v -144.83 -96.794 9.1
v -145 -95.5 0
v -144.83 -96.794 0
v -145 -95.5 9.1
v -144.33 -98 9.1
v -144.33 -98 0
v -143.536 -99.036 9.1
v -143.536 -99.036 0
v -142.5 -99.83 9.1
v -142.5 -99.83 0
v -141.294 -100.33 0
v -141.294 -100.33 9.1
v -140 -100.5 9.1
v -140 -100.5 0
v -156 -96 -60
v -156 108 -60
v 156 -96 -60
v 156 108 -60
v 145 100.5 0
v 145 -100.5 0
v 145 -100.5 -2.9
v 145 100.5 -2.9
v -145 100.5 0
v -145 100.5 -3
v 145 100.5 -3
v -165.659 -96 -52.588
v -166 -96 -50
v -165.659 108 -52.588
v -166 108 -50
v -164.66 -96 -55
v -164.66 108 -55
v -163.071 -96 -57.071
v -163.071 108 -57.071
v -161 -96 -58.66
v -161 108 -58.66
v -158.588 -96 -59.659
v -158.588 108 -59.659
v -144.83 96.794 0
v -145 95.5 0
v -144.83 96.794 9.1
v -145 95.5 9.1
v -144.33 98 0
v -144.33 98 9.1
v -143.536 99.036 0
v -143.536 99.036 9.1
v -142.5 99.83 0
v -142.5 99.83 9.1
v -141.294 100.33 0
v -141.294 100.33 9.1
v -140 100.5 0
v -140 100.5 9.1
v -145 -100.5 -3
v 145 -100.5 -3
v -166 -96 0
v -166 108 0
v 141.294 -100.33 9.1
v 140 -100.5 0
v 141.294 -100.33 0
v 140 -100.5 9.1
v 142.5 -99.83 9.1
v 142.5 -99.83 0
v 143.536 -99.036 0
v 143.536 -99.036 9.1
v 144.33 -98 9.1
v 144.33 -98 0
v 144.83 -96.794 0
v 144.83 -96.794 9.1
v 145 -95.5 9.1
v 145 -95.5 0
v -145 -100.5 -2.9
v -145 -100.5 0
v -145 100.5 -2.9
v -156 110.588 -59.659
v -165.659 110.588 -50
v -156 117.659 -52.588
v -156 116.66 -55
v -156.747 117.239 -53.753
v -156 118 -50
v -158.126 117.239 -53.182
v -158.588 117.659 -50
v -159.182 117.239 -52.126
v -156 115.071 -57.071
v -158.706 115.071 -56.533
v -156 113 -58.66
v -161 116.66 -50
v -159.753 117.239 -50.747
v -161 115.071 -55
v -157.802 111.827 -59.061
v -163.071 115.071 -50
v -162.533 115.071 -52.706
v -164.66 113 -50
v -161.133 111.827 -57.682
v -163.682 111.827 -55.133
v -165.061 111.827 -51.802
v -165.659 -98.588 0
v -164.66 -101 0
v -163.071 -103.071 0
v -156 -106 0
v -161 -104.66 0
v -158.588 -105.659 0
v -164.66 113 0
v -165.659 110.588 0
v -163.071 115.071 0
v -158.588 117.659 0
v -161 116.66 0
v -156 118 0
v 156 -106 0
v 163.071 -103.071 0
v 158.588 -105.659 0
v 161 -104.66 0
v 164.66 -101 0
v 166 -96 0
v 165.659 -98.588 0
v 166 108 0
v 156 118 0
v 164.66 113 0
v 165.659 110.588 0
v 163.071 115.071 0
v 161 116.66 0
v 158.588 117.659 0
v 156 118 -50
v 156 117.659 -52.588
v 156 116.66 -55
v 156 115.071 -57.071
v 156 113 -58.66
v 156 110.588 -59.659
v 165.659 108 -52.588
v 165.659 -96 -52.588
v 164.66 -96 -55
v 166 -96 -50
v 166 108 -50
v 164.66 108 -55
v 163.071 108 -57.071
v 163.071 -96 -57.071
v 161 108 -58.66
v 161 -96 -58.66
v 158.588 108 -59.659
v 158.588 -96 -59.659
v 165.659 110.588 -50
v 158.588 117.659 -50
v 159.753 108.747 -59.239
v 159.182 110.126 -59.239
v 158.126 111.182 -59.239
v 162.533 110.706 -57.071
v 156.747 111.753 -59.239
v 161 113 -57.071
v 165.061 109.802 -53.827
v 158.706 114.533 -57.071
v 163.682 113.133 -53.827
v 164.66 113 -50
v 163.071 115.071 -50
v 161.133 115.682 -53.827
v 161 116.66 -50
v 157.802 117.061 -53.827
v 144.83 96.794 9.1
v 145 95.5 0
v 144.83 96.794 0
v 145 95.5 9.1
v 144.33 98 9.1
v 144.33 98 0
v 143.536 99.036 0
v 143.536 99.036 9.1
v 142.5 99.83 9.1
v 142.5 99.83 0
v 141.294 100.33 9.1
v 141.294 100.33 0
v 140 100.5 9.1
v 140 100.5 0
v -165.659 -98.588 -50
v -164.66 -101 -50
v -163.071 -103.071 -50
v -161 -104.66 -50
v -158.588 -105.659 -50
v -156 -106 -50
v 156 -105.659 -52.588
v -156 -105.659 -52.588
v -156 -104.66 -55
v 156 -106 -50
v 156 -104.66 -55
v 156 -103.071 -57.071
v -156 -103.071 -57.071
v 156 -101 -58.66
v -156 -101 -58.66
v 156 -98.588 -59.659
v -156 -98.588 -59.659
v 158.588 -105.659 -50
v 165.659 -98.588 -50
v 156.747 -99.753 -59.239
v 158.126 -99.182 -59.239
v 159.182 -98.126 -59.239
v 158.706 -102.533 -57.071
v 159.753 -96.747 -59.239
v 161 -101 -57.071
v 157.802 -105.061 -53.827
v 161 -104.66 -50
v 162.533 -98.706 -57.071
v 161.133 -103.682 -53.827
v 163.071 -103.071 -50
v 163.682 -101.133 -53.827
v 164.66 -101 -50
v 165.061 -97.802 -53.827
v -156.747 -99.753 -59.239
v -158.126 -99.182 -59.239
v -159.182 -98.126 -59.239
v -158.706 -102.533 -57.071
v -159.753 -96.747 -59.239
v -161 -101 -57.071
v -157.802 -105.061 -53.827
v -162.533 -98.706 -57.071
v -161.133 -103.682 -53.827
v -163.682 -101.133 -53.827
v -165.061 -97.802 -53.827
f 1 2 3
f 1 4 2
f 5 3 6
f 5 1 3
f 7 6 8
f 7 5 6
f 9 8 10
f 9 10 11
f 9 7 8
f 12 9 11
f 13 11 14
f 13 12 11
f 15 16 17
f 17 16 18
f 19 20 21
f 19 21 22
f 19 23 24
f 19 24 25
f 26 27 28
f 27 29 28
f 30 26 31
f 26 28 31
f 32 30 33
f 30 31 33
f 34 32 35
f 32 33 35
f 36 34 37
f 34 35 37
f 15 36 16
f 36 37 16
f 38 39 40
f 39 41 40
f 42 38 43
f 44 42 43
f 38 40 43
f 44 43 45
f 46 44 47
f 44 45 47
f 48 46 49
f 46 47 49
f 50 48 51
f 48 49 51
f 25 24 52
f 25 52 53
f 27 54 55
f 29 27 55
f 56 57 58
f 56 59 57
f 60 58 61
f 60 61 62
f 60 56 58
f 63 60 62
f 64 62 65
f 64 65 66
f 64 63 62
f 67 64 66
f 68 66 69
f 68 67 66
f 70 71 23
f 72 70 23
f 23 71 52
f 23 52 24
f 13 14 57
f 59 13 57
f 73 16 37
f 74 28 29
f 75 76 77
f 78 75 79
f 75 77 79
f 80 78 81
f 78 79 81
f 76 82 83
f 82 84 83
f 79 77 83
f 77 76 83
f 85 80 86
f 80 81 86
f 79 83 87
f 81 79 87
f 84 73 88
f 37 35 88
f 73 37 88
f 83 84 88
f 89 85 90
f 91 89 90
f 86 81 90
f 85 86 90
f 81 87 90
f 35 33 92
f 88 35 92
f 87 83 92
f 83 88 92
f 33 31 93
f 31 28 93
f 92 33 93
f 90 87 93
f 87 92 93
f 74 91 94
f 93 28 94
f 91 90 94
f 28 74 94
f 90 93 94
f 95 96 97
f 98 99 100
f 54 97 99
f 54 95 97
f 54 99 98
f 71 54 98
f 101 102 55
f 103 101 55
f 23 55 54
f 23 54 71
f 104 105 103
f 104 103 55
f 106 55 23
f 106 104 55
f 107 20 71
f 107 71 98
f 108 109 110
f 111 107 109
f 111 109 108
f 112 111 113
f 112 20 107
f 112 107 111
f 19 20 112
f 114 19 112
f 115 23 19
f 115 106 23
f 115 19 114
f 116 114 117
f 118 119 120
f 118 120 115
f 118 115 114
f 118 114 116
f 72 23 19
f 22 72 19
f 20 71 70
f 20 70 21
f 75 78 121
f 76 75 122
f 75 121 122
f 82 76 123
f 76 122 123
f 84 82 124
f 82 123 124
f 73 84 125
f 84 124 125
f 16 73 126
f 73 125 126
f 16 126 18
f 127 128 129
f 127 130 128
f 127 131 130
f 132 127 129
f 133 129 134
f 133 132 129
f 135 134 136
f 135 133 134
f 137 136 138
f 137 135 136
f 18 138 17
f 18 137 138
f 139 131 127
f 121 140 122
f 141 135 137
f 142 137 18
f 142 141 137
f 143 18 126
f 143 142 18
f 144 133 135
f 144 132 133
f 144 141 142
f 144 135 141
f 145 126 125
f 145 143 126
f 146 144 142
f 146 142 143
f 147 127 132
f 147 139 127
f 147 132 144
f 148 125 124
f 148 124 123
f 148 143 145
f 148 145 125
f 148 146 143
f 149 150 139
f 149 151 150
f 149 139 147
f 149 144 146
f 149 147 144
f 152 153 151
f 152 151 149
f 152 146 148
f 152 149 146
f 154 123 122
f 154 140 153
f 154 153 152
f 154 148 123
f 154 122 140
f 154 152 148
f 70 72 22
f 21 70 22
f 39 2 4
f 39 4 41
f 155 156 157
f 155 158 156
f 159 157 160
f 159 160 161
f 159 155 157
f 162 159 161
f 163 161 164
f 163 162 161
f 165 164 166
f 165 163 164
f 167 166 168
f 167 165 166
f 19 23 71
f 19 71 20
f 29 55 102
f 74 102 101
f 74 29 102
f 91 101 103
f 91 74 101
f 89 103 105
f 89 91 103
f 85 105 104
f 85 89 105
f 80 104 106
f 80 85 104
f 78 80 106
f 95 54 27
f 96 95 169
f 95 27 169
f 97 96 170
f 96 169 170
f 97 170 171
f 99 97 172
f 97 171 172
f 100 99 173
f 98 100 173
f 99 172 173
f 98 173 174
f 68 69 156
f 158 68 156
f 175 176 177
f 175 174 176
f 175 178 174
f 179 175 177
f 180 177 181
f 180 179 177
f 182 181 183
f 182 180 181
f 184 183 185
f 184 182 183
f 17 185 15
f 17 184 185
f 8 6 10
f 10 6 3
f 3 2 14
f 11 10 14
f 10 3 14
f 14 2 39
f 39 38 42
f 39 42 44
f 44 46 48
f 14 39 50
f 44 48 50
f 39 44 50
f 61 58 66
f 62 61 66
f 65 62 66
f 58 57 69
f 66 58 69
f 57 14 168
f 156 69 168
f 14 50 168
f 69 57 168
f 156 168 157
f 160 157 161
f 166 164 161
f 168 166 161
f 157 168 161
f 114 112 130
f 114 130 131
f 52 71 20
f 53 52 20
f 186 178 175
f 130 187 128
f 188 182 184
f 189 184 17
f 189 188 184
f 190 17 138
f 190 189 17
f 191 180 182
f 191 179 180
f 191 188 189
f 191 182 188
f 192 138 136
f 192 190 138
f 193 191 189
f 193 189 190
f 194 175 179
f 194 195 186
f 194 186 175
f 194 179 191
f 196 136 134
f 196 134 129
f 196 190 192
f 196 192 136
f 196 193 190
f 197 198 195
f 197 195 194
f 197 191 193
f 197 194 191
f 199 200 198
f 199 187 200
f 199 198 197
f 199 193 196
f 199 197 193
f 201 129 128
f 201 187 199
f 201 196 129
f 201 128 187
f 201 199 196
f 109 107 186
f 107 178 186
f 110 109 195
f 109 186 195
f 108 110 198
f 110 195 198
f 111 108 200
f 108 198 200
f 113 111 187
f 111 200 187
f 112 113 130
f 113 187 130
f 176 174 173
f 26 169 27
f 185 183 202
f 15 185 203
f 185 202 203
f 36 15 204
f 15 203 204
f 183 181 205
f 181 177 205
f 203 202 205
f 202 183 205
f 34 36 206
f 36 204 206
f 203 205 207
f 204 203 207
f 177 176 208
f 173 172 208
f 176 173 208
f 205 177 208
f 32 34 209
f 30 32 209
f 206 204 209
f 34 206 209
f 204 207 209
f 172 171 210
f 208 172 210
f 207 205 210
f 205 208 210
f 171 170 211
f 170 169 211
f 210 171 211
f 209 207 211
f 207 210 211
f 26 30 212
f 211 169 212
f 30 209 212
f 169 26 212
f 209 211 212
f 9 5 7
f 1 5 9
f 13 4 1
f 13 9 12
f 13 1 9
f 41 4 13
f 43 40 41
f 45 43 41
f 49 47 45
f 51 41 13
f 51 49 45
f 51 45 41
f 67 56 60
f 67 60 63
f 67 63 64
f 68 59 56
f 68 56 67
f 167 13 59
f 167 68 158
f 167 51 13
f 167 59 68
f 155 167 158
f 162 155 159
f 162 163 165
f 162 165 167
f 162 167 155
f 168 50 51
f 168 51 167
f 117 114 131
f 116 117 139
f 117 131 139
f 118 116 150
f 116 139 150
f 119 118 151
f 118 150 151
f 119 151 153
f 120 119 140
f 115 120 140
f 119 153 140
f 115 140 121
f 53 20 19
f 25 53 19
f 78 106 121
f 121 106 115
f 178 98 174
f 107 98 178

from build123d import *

# Parameters (mm, degrees)
F0_W     = 332
F0_H     = 224
F0_W_2   = 290
F0_H_2   = 201
F1_DEPTH = 60
F2_R     = 10
F3_DEPTH = 3
F4_DEPTH = 2.9
F5_DEPTH = 9.1
F6_R     = 5


# Not quite as in the source:
# - the program builds the solid bodies; features that only make, move or delete a surface that nothing else refers to are left out


with BuildPart() as f1:
    # F0 (on Top) → F1 (new body)
    with BuildSketch(Plane.XY):
        with Locations((0, 6)):
            Rectangle(F0_W, F0_H)
        Rectangle(F0_W_2, F0_H_2, mode=Mode.SUBTRACT)
        Rectangle(F0_W_2, F0_H_2)
    extrude(amount=-F1_DEPTH)

    # F2
    f2_edges = [f1.edges().sort_by_distance(p)[0] for p in [
        (166, -106, -30),
        (166, 118, -30),
        (-166, -106, -30),
        (0, -106, -60),
        (166, 6, -60),
        (-166, 6, -60),
        (0, 118, -60),
        (-166, 118, -30),
    ]]
    fillet(f2_edges, radius=F2_R)

    # F0 (on Top) → F3 (cut)
    with BuildSketch(Plane.XY):
        Rectangle(F0_W_2, F0_H_2)
    extrude(amount=-F3_DEPTH, mode=Mode.SUBTRACT)


with BuildPart() as f4:
    # F0 (on Top) → F4 (new body)
    with BuildSketch(Plane.XY):
        Rectangle(F0_W_2, F0_H_2)
    extrude(amount=-F4_DEPTH)


with BuildPart() as f5:
    # F0 (on Top) → F5 (new body)
    with BuildSketch(Plane.XY):
        Rectangle(F0_W_2, F0_H_2)
    extrude(amount=F5_DEPTH)

    # F6
    f6_edges = [f5.edges().sort_by_distance(p)[0] for p in [
        (145, -100.5, 4.55),
        (145, 100.5, 4.55),
        (-145, -100.5, 4.55),
        (-145, 100.5, 4.55),
    ]]
    fillet(f6_edges, radius=F6_R)


solid = Compound([f1.part, f4.part, f5.part])
